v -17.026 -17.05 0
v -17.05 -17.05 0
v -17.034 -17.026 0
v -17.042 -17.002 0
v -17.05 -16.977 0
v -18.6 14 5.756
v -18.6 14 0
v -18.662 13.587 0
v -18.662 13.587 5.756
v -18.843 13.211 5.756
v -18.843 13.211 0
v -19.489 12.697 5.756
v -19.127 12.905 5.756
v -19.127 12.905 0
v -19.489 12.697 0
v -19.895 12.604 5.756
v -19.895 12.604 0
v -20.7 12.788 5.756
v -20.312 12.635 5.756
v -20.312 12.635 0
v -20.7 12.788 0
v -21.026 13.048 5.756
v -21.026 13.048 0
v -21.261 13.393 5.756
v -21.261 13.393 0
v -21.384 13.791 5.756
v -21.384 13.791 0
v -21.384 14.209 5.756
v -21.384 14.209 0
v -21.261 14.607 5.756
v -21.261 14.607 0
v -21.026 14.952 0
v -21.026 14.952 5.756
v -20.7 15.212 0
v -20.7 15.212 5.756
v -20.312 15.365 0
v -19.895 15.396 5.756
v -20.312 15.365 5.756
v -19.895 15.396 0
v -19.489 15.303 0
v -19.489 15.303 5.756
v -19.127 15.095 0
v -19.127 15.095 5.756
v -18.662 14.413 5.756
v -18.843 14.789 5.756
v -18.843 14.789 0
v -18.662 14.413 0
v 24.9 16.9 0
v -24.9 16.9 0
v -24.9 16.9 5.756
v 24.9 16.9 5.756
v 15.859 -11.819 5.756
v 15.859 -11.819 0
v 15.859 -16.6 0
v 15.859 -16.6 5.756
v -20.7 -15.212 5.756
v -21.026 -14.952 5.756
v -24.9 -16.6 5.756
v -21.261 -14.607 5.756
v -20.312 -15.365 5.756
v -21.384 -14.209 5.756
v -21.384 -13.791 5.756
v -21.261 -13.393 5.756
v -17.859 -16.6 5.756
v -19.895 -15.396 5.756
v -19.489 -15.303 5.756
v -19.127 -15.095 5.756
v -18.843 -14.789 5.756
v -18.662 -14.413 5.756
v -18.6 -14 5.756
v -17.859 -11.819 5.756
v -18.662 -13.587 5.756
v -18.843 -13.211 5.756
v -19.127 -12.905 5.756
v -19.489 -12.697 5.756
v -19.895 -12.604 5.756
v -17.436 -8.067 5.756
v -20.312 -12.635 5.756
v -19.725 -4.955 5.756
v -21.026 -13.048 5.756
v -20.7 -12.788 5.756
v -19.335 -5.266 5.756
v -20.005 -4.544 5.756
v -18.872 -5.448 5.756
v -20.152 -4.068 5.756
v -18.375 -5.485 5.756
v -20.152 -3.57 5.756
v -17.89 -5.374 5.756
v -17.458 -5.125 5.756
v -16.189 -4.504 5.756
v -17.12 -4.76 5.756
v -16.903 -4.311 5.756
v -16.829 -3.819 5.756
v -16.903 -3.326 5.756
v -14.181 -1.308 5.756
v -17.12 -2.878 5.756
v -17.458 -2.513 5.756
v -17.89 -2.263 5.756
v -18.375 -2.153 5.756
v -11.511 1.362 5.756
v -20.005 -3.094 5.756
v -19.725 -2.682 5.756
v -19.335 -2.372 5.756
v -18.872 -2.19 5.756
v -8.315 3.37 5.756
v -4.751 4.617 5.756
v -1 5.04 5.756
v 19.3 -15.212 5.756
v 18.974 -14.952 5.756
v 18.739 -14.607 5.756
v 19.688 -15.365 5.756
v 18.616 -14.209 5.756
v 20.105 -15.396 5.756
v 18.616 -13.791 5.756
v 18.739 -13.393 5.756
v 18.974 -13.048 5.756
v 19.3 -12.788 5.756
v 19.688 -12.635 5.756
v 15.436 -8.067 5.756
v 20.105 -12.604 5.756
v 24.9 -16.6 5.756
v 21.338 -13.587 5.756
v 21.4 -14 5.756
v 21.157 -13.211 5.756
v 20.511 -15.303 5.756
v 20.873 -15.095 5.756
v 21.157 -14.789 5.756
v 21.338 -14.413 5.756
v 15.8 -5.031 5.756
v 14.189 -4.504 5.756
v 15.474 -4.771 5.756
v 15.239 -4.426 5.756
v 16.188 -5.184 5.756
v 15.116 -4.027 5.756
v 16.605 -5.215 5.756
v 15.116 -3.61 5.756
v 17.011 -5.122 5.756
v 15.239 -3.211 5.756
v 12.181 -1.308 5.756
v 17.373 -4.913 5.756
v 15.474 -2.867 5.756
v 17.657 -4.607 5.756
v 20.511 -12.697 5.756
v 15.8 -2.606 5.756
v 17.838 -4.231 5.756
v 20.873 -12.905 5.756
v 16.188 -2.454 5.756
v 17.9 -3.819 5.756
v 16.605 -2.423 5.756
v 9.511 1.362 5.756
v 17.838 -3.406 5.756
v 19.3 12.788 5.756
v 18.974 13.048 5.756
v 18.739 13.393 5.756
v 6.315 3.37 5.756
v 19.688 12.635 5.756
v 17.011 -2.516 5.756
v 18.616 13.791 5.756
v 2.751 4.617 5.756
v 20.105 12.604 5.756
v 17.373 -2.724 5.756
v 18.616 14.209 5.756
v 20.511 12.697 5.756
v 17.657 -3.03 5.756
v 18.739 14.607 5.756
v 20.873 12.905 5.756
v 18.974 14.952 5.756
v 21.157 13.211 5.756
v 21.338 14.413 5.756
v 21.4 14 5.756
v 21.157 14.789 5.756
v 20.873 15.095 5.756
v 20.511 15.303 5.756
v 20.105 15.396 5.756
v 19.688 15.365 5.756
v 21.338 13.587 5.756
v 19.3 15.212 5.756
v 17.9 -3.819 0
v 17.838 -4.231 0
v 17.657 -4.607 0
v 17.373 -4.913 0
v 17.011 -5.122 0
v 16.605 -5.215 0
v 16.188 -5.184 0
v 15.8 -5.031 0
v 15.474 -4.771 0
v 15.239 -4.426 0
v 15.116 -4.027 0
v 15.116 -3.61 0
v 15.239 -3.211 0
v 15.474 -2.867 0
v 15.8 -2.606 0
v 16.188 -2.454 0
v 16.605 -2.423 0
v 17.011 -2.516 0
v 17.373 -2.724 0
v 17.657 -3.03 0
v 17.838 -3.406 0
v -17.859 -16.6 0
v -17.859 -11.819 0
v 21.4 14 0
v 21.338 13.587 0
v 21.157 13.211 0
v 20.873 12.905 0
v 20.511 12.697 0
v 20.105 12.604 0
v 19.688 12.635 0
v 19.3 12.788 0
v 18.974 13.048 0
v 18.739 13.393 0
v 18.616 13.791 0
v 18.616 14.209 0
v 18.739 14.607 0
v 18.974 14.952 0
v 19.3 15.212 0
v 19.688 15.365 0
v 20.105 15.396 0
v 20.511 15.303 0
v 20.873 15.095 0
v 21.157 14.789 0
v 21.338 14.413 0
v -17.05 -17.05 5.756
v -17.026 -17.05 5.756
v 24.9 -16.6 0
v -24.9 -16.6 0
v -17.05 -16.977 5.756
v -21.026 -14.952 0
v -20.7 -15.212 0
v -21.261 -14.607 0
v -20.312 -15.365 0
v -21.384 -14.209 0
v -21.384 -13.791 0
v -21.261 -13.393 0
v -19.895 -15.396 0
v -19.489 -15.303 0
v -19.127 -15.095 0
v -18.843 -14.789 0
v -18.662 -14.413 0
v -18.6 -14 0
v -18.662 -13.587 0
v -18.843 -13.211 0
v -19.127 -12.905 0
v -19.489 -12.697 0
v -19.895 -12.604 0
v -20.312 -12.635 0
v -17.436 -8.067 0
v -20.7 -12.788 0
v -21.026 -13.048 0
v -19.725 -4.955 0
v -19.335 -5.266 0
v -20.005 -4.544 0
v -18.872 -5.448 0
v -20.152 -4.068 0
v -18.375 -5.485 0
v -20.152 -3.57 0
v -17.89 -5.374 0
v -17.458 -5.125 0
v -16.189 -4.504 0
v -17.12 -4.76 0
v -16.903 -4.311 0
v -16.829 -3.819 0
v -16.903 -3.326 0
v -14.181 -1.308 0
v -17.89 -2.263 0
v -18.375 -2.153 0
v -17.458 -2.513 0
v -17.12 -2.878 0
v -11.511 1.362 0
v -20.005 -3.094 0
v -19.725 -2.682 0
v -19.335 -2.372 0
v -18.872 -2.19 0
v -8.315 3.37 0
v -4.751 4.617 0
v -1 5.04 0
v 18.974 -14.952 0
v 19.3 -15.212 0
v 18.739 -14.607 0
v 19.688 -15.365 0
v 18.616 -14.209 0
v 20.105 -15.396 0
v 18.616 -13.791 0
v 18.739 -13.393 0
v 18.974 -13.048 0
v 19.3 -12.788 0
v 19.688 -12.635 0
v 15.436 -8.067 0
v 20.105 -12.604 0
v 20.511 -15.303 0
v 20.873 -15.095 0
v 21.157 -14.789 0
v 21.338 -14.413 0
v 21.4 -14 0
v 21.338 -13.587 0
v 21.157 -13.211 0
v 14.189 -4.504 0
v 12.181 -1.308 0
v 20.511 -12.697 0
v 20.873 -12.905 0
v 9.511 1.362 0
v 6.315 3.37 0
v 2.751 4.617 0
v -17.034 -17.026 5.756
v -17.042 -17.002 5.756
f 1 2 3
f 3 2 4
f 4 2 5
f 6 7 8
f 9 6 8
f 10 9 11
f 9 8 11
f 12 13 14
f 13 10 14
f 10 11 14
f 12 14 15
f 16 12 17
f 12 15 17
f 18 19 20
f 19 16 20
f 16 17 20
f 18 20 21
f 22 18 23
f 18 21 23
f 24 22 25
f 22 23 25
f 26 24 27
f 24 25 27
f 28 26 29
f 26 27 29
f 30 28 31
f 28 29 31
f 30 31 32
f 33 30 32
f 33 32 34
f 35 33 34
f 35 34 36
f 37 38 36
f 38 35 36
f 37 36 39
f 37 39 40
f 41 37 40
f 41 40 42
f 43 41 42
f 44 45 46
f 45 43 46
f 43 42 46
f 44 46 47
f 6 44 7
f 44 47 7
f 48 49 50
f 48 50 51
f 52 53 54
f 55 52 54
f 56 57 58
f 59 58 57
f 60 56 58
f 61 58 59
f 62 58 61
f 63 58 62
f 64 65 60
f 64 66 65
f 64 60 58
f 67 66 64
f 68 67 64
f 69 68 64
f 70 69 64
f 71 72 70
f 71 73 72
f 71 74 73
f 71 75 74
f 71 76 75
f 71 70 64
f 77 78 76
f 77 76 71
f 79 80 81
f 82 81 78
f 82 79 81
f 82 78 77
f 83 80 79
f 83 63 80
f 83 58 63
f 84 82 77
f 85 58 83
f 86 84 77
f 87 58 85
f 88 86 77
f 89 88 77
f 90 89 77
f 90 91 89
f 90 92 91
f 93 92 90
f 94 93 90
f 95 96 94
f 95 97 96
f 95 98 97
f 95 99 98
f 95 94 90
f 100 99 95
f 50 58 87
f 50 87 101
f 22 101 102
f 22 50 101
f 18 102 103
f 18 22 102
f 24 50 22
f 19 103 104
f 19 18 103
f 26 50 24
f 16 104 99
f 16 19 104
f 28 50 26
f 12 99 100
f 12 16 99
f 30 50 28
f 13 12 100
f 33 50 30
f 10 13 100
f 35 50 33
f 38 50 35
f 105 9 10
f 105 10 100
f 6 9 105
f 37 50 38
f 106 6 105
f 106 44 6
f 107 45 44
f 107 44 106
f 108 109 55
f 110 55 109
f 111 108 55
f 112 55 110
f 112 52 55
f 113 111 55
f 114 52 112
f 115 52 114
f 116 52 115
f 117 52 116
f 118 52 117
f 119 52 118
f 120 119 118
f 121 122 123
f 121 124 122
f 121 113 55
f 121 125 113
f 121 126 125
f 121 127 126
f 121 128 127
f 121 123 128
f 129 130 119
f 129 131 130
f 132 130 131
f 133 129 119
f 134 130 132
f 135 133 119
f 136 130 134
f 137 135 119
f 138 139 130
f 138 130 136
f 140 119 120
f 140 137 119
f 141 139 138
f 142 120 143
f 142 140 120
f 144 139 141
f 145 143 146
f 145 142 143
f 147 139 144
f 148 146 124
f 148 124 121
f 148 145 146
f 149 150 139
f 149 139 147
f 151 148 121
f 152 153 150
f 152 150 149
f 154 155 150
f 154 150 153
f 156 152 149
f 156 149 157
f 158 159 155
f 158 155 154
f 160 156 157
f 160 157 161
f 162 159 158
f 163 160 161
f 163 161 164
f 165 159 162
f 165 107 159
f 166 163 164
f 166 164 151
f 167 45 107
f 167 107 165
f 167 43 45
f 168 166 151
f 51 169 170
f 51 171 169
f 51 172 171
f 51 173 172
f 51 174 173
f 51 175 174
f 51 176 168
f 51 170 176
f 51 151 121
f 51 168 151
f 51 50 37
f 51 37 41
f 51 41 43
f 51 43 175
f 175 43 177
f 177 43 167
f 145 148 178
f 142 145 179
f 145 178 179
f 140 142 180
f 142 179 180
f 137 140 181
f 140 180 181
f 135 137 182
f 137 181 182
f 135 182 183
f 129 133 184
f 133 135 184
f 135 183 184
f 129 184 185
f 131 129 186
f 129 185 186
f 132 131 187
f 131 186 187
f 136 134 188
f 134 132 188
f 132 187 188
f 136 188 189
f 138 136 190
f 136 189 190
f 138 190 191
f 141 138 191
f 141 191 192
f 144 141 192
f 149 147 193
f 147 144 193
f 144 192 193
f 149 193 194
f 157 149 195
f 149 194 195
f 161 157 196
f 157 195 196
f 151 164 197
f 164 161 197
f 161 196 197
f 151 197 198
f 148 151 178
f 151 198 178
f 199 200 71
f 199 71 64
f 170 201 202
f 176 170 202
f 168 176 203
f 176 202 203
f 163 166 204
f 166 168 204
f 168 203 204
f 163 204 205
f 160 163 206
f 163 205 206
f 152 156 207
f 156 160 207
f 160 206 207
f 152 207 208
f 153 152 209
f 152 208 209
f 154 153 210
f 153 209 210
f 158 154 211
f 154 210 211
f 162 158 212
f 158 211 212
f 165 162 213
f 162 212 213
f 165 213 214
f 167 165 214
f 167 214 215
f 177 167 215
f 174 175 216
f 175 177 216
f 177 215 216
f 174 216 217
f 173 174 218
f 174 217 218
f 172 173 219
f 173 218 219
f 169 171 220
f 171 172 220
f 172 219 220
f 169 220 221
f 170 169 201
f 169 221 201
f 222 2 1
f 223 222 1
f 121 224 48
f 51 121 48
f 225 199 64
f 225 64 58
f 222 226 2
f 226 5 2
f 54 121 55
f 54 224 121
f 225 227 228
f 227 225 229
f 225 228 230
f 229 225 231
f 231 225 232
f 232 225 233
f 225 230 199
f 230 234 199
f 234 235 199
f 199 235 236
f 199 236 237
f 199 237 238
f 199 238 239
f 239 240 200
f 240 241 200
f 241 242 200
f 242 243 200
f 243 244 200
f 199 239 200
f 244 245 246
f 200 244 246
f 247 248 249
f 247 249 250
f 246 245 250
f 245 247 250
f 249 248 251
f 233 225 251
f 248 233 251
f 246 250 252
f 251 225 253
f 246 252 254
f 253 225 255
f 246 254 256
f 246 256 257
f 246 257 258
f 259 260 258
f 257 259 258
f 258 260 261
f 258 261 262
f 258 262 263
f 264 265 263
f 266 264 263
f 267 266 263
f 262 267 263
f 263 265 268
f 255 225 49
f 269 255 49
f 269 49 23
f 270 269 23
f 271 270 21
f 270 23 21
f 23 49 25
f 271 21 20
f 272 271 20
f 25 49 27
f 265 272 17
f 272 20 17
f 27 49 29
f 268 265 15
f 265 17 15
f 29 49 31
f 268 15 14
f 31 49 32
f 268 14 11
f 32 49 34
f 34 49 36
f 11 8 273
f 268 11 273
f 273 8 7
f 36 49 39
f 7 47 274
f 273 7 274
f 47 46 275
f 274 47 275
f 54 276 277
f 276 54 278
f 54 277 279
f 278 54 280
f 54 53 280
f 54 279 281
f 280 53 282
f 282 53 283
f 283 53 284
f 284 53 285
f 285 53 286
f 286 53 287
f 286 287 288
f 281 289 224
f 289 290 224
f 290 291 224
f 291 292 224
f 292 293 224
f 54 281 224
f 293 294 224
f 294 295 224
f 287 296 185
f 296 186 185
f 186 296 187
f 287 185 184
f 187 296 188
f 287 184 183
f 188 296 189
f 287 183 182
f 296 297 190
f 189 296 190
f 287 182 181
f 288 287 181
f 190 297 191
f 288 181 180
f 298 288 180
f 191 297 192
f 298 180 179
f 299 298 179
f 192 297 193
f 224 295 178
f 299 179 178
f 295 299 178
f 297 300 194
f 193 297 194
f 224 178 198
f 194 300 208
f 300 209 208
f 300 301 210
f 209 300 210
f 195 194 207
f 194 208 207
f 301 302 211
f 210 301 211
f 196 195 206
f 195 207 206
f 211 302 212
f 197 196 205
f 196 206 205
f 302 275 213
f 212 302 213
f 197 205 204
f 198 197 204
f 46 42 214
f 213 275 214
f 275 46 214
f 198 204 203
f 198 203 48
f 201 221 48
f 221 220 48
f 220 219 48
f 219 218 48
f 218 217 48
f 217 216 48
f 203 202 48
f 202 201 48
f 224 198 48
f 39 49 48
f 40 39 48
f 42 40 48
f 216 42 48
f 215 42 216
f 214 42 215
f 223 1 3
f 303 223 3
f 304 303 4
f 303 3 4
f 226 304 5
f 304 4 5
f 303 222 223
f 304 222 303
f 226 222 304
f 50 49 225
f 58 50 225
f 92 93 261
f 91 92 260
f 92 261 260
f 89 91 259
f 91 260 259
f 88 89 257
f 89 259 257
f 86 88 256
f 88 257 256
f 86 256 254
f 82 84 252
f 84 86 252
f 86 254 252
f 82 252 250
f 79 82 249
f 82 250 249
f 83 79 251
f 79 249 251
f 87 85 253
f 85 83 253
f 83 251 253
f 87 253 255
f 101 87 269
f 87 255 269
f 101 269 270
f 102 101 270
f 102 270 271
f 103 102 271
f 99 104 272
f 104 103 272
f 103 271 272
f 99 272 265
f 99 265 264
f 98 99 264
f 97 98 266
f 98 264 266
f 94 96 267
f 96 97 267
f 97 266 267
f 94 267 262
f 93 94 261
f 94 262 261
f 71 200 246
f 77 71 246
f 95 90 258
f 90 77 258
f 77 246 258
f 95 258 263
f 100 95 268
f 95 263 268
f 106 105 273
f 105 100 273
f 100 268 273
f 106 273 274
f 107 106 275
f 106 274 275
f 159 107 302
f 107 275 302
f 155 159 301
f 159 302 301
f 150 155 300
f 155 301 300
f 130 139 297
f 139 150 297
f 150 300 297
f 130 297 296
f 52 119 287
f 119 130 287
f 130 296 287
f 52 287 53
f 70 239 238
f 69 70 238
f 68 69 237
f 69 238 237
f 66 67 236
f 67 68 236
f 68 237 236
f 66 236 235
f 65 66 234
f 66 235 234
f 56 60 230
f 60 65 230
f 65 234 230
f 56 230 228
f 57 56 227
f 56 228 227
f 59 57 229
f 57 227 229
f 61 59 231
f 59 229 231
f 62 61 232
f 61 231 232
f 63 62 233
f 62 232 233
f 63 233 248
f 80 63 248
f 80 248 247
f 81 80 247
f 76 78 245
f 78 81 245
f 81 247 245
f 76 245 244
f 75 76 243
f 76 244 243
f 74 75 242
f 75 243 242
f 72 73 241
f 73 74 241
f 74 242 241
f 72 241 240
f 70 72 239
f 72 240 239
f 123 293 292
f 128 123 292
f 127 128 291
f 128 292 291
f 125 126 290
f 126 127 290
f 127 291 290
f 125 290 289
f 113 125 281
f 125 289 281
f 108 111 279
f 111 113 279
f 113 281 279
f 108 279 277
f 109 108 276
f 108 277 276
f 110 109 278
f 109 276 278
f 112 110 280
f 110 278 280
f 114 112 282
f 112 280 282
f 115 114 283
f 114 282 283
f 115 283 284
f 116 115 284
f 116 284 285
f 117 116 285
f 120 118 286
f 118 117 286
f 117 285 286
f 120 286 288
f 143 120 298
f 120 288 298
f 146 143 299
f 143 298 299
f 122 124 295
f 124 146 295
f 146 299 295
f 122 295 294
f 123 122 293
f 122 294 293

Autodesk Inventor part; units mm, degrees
ref_plane "YZ Plane" through (0, 0, 0) normal (1, 0, 0) x (0, 1, 0)
ref_plane "Work Plane1" through (0, 0, 0) normal (0, 0, 1) x (1, 0, 0)
sketch "Sketch1" plane through (0, 0, 0) normal (0, 0, 1) x (1, 0, 0)
  circle A0 centre (-20, 14) radius 1.4 projected
  circle A1 centre (-20, -14) radius 1.4 projected
  circle A2 centre (20, -14) radius 1.4 projected
  circle A3 centre (20, 14) radius 1.4 projected
  line L0 (-24.9, 22.9) -> (-24.9, -22.9) projected
  line L1 (24.9, -22.9) -> (24.9, 22.9) projected
  line L2 (-24.9, 16.9002) -> (24.9, 16.9002)
  line L3 (24.9, 16.9002) -> (24.9, -16.5998)
  line L4 (-24.9, -16.5998) -> (-24.9, 16.9002)
  line L5 (-17.05, -17.05) -> (-17.05, 17.05) construction
  line L6 (17.05, 17.05) -> (17.05, -17.05) construction
  line L7 (-17.05, -17.05) -> (17.05, -17.05)
  line L8 (17.05, -17.05) -> (17.05, 4.95)
  line L9 (-17.05, 4.95) -> (-17.05, -17.05)
  circle A4 centre (-1, -11.8188) radius 15.5 construction
  line L10 (15.8586, -11.8188) -> (15.8586, -16.5998)
  line L11 (-17.8586, -11.8188) -> (-17.8586, -16.5998)
  arc A5 (15.8586, -11.8188) -> (-17.8586, -11.8188) centre (-1, -11.8188) ccw
  arc A6 (-17.05, -16.9773) -> (-17.0265, -17.05) centre (-1, -11.8188) ccw
  line L12 (24.9, -16.5998) -> (15.8586, -16.5998)
  line L13 (-17.8586, -16.5998) -> (-24.9, -16.5998)
  arc A7 (14.4, -3.8188) -> (18.6, -3.8188) centre (16.5, -3.8188) ccw construction
  arc A8 (-20.6, -3.8188) -> (-16.4, -3.8188) centre (-18.5, -3.8188) ccw construction
  circle A9 centre (-18.5, -3.8188) radius 1.6708
  circle A10 centre (16.5, -3.8188) radius 1.4
  dimension "d0" = 33.5
  dimension "d1" = 22
  dimension "d4" = 2.8
  dimension "d5" = 0
ref_plane "Work Plane2" through (-22, -17.8188, 7.2556) normal (0, 0, 1) x (1, 0, 0)
ref_plane "Work Plane3" through (-22, -17.8188, 5.7556) normal (0, 0, 1) x (1, 0, 0)
extrude "Extrusion1" add sketch "Sketch1" along normal up to surface (5.7556 mm away) contours L2 L1 L12 L10 A5 L11 L13 L0 | A6 L7 L9
properties part number "20_Cube_Insert_Beamsplittercube_motorized_motormount"
